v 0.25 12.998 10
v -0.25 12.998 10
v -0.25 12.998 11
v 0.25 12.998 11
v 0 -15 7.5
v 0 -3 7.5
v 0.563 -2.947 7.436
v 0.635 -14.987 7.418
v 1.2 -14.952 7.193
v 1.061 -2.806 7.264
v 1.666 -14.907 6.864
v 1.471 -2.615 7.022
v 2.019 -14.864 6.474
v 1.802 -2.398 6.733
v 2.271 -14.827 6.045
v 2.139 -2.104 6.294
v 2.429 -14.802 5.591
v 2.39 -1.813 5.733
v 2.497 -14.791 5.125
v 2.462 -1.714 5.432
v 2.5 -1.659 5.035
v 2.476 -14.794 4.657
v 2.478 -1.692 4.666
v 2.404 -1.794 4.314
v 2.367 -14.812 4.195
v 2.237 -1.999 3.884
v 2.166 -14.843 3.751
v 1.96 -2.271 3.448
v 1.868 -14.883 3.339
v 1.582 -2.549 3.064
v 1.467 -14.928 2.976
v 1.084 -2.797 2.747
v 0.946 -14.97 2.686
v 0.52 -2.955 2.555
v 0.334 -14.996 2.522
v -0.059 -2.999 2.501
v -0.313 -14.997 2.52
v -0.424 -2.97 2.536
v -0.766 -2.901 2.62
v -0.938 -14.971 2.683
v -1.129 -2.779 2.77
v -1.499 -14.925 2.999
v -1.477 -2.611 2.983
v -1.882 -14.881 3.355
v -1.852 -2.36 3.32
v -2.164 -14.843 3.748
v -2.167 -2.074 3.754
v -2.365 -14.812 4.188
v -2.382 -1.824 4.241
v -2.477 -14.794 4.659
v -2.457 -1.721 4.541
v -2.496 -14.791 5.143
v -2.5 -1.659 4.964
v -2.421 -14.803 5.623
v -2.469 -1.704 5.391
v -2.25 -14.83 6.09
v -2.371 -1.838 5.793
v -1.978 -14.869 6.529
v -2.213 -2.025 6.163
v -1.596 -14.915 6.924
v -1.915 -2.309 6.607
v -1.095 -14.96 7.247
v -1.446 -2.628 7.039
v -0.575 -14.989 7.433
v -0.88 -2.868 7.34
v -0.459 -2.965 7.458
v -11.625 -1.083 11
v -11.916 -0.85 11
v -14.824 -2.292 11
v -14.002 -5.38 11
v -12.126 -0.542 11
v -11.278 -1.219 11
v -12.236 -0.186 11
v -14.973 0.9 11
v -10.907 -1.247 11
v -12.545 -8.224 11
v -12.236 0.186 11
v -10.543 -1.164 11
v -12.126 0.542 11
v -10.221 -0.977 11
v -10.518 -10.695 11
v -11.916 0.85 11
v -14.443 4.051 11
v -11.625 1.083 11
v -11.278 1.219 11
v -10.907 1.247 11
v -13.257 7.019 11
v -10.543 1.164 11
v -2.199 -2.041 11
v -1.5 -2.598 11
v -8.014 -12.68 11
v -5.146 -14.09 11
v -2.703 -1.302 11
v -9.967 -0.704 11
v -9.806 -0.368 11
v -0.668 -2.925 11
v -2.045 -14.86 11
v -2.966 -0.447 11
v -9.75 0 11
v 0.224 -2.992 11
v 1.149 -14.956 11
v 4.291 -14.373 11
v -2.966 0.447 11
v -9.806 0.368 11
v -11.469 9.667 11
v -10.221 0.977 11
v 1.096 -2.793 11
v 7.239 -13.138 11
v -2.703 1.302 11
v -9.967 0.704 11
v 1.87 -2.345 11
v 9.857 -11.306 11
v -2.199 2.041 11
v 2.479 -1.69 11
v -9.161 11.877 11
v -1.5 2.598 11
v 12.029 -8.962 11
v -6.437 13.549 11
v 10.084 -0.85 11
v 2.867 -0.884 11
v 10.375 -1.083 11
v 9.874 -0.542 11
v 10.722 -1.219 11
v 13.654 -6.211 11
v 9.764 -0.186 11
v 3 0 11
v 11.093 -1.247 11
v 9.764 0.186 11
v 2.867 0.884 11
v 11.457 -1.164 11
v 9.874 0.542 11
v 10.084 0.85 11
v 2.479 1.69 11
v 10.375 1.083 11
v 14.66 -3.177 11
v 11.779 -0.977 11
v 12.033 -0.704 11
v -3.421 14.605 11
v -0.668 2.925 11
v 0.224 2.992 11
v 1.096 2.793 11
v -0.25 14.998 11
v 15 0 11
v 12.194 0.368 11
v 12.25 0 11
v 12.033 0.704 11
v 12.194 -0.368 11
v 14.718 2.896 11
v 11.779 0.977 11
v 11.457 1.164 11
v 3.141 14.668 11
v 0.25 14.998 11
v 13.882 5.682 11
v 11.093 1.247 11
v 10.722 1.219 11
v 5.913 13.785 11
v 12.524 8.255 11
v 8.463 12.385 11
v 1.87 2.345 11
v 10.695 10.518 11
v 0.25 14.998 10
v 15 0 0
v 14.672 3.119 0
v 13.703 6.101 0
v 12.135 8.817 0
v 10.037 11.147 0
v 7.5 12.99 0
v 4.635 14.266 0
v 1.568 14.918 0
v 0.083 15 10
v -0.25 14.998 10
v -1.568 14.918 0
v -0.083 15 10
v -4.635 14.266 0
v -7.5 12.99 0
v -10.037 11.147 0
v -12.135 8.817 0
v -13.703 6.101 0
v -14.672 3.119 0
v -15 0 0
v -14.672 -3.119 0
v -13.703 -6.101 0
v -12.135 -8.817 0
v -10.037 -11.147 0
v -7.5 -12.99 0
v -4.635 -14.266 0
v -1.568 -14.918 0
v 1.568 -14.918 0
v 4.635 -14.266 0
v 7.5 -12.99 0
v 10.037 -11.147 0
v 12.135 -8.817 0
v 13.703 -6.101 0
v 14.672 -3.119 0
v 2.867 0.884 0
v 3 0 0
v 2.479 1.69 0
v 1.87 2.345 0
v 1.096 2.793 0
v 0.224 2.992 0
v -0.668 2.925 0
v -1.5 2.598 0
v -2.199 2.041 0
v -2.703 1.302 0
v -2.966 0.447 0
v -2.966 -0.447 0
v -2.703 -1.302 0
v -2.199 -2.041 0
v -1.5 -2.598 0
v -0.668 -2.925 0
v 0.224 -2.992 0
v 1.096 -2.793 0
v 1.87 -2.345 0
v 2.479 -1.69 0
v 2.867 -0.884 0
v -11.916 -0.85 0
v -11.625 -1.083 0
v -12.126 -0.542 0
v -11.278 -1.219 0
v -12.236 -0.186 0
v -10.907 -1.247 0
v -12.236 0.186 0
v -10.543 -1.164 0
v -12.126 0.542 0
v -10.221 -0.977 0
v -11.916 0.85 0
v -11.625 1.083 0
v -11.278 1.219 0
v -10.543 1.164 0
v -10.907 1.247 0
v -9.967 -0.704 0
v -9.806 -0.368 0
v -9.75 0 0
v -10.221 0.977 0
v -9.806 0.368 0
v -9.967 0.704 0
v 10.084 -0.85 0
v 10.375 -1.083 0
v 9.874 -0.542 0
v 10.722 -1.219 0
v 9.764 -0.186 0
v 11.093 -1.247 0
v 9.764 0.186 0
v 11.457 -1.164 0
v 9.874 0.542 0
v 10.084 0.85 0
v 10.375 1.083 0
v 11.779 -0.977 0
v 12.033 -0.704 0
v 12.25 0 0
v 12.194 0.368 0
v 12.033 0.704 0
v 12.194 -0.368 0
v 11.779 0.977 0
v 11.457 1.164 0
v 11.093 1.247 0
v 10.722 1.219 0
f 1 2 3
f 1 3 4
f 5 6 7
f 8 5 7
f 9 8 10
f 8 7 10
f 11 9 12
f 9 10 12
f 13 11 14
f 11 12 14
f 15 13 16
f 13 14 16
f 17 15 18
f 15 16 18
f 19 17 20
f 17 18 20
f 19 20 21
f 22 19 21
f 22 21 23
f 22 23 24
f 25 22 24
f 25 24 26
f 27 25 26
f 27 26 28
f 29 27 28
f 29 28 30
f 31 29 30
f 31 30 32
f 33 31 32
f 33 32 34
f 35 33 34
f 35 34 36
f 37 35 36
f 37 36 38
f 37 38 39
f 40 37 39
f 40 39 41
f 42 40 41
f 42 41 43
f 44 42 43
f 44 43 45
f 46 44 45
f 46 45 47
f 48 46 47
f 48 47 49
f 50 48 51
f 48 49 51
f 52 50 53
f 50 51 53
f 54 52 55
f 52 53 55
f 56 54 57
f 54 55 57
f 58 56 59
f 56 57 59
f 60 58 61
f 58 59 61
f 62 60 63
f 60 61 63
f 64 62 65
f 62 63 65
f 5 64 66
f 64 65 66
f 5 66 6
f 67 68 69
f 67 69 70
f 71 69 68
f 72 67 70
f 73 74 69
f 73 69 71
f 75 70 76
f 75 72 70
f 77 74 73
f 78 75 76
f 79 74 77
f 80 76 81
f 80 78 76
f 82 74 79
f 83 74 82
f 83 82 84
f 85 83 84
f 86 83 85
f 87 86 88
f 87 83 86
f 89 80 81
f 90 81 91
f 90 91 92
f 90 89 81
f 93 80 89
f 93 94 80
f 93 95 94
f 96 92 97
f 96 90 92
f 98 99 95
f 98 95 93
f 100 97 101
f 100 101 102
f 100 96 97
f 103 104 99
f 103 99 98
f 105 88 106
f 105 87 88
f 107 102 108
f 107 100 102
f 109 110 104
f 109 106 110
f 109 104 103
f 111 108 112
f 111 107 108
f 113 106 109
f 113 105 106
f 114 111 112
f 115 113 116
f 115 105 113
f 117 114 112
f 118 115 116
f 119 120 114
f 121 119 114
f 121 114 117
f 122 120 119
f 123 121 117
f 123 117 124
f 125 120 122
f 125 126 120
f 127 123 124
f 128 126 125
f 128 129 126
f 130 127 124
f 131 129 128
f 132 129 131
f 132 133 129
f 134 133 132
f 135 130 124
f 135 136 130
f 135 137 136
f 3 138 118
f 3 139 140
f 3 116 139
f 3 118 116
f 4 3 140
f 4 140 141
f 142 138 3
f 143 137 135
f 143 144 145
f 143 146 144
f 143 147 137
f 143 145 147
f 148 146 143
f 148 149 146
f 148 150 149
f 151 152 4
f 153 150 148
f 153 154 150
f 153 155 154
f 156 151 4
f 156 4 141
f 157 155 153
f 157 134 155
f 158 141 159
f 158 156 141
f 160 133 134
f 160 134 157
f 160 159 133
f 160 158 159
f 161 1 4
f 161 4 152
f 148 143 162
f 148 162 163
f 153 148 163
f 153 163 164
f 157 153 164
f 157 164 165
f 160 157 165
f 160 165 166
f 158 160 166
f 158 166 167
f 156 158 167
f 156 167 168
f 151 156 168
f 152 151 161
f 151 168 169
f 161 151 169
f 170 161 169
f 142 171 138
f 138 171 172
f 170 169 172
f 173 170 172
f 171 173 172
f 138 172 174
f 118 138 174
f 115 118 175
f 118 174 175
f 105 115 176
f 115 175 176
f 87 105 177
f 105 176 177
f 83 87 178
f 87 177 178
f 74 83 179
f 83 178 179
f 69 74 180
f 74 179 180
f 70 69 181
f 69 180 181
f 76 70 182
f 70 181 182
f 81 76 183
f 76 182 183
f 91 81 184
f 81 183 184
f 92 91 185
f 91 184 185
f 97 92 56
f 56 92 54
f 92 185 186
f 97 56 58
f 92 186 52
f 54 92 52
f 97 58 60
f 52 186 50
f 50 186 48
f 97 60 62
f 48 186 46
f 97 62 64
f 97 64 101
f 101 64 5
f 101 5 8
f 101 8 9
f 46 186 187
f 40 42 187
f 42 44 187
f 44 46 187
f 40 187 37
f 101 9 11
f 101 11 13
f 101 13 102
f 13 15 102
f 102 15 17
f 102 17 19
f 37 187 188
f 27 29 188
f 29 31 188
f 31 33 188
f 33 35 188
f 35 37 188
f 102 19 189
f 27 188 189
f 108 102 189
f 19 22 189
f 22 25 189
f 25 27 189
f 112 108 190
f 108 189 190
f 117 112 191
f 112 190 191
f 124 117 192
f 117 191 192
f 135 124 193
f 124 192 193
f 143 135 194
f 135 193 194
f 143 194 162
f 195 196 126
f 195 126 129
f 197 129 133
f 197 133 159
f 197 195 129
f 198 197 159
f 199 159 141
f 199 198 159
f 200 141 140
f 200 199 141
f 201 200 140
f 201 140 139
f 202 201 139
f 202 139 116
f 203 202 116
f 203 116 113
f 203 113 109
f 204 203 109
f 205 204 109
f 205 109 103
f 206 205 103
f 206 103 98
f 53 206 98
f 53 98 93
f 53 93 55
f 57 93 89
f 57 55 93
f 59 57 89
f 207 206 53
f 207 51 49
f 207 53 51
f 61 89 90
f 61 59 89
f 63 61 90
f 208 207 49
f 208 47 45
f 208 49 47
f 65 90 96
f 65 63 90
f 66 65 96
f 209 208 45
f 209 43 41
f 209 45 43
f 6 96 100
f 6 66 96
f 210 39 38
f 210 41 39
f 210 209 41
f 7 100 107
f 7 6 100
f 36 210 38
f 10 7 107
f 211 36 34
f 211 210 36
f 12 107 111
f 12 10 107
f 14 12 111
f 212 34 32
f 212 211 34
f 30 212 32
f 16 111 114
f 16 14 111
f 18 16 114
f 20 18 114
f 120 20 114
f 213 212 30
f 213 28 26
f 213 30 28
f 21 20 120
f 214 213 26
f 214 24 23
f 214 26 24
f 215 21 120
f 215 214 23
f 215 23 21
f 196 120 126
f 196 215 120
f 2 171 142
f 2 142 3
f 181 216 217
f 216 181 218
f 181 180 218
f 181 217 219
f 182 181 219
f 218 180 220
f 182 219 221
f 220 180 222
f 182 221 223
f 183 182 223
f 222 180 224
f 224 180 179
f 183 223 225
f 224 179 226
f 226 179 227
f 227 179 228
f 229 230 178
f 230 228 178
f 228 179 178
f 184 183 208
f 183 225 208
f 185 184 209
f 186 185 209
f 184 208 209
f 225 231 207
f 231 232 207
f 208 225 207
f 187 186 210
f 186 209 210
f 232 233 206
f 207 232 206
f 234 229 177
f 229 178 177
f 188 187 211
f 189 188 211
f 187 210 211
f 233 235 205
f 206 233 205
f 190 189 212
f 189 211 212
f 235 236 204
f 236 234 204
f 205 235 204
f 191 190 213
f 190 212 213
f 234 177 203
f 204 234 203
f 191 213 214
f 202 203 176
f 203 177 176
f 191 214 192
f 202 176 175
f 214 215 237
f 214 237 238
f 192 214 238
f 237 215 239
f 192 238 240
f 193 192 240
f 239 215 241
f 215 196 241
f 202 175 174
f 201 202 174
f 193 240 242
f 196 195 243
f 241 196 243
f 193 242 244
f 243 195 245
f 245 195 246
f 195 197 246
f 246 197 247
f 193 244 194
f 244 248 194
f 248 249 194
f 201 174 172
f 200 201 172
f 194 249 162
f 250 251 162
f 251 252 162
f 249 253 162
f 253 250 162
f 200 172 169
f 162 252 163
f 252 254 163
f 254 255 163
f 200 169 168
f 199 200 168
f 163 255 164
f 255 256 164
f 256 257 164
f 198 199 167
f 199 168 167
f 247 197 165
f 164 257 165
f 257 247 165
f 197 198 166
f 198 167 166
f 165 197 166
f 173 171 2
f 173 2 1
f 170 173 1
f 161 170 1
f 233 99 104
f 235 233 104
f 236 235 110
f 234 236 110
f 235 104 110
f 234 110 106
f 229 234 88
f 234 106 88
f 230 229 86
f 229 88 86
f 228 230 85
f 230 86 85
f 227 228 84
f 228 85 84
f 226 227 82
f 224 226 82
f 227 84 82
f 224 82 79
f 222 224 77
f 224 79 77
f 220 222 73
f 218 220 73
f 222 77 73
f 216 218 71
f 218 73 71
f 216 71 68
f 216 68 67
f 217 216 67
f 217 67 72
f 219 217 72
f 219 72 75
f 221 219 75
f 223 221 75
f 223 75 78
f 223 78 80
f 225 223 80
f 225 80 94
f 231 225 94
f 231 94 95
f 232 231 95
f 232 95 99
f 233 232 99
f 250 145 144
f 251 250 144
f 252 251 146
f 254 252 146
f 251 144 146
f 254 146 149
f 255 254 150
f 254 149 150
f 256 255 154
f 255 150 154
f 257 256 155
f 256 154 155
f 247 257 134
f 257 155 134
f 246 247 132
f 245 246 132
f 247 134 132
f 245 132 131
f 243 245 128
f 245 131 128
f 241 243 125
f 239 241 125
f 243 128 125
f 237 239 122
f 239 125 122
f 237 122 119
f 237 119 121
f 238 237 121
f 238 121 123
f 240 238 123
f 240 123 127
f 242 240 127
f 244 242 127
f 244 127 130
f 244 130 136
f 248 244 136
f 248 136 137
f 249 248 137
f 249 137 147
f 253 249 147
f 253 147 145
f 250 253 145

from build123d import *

# Parameters (mm, degrees)
CROQUIS1_R              = 15
CROQUIS1_R_2            = 3
SALIENTE_EXTRUIR1_DEPTH = 11
CORTAR_EXTRUIR1_START   = -1
CORTAR_EXTRUIR1_DEPTH   = 1
CROQUIS3_R              = 1.25
CORTAR_EXTRUIR2_DEPTH   = 24.895606291
CROQUIS4_R              = 2.5
CORTAR_EXTRUIR3_DEPTH   = 16


# Read off the part's stored shape, not the designer's step: Cortar-Extruir1
with BuildPart() as part:
    # Croquis1 → Saliente-Extruir1 (new body)
    with BuildSketch(Plane.XY):
        Circle(CROQUIS1_R)
        Circle(CROQUIS1_R_2, mode=Mode.SUBTRACT)
    extrude(amount=SALIENTE_EXTRUIR1_DEPTH)

    # Cortar-Extruir1 outline → Cortar-Extruir1 (cut)
    with BuildSketch(Plane.XY.offset(11).offset(CORTAR_EXTRUIR1_START)):
        with BuildLine():
            Line((-0.25, 14.997916522), (-0.25, 12.997916522))
            Line((-0.25, 12.997916522), (0.25, 12.997916522))
            Line((0.25, 12.997916522), (0.25, 14.997916522))
            ThreePointArc((0.25, 14.997916522), (0, 15), (-0.25, 14.997916522))
        make_face()
    extrude(amount=CORTAR_EXTRUIR1_DEPTH, mode=Mode.SUBTRACT)

    # Croquis3 → Cortar-Extruir2 (cut, through all)
    with BuildSketch(Plane.XY.offset(11)):
        with Locations((11, 0)):
            Circle(CROQUIS3_R)
        with Locations((-11, 0)):
            Circle(CROQUIS3_R)
    extrude(amount=-CORTAR_EXTRUIR2_DEPTH, mode=Mode.SUBTRACT)

    # Croquis4 → Cortar-Extruir3 (cut)
    with BuildSketch(Plane(origin=(0, 0, 0), x_dir=(1, 0, 0), z_dir=(0, 1, 0))):
        with Locations(Location((0, -5, 0), (0, 0, 270))):
            Circle(CROQUIS4_R)
    extrude(amount=-CORTAR_EXTRUIR3_DEPTH, mode=Mode.SUBTRACT)


solid = part.part
